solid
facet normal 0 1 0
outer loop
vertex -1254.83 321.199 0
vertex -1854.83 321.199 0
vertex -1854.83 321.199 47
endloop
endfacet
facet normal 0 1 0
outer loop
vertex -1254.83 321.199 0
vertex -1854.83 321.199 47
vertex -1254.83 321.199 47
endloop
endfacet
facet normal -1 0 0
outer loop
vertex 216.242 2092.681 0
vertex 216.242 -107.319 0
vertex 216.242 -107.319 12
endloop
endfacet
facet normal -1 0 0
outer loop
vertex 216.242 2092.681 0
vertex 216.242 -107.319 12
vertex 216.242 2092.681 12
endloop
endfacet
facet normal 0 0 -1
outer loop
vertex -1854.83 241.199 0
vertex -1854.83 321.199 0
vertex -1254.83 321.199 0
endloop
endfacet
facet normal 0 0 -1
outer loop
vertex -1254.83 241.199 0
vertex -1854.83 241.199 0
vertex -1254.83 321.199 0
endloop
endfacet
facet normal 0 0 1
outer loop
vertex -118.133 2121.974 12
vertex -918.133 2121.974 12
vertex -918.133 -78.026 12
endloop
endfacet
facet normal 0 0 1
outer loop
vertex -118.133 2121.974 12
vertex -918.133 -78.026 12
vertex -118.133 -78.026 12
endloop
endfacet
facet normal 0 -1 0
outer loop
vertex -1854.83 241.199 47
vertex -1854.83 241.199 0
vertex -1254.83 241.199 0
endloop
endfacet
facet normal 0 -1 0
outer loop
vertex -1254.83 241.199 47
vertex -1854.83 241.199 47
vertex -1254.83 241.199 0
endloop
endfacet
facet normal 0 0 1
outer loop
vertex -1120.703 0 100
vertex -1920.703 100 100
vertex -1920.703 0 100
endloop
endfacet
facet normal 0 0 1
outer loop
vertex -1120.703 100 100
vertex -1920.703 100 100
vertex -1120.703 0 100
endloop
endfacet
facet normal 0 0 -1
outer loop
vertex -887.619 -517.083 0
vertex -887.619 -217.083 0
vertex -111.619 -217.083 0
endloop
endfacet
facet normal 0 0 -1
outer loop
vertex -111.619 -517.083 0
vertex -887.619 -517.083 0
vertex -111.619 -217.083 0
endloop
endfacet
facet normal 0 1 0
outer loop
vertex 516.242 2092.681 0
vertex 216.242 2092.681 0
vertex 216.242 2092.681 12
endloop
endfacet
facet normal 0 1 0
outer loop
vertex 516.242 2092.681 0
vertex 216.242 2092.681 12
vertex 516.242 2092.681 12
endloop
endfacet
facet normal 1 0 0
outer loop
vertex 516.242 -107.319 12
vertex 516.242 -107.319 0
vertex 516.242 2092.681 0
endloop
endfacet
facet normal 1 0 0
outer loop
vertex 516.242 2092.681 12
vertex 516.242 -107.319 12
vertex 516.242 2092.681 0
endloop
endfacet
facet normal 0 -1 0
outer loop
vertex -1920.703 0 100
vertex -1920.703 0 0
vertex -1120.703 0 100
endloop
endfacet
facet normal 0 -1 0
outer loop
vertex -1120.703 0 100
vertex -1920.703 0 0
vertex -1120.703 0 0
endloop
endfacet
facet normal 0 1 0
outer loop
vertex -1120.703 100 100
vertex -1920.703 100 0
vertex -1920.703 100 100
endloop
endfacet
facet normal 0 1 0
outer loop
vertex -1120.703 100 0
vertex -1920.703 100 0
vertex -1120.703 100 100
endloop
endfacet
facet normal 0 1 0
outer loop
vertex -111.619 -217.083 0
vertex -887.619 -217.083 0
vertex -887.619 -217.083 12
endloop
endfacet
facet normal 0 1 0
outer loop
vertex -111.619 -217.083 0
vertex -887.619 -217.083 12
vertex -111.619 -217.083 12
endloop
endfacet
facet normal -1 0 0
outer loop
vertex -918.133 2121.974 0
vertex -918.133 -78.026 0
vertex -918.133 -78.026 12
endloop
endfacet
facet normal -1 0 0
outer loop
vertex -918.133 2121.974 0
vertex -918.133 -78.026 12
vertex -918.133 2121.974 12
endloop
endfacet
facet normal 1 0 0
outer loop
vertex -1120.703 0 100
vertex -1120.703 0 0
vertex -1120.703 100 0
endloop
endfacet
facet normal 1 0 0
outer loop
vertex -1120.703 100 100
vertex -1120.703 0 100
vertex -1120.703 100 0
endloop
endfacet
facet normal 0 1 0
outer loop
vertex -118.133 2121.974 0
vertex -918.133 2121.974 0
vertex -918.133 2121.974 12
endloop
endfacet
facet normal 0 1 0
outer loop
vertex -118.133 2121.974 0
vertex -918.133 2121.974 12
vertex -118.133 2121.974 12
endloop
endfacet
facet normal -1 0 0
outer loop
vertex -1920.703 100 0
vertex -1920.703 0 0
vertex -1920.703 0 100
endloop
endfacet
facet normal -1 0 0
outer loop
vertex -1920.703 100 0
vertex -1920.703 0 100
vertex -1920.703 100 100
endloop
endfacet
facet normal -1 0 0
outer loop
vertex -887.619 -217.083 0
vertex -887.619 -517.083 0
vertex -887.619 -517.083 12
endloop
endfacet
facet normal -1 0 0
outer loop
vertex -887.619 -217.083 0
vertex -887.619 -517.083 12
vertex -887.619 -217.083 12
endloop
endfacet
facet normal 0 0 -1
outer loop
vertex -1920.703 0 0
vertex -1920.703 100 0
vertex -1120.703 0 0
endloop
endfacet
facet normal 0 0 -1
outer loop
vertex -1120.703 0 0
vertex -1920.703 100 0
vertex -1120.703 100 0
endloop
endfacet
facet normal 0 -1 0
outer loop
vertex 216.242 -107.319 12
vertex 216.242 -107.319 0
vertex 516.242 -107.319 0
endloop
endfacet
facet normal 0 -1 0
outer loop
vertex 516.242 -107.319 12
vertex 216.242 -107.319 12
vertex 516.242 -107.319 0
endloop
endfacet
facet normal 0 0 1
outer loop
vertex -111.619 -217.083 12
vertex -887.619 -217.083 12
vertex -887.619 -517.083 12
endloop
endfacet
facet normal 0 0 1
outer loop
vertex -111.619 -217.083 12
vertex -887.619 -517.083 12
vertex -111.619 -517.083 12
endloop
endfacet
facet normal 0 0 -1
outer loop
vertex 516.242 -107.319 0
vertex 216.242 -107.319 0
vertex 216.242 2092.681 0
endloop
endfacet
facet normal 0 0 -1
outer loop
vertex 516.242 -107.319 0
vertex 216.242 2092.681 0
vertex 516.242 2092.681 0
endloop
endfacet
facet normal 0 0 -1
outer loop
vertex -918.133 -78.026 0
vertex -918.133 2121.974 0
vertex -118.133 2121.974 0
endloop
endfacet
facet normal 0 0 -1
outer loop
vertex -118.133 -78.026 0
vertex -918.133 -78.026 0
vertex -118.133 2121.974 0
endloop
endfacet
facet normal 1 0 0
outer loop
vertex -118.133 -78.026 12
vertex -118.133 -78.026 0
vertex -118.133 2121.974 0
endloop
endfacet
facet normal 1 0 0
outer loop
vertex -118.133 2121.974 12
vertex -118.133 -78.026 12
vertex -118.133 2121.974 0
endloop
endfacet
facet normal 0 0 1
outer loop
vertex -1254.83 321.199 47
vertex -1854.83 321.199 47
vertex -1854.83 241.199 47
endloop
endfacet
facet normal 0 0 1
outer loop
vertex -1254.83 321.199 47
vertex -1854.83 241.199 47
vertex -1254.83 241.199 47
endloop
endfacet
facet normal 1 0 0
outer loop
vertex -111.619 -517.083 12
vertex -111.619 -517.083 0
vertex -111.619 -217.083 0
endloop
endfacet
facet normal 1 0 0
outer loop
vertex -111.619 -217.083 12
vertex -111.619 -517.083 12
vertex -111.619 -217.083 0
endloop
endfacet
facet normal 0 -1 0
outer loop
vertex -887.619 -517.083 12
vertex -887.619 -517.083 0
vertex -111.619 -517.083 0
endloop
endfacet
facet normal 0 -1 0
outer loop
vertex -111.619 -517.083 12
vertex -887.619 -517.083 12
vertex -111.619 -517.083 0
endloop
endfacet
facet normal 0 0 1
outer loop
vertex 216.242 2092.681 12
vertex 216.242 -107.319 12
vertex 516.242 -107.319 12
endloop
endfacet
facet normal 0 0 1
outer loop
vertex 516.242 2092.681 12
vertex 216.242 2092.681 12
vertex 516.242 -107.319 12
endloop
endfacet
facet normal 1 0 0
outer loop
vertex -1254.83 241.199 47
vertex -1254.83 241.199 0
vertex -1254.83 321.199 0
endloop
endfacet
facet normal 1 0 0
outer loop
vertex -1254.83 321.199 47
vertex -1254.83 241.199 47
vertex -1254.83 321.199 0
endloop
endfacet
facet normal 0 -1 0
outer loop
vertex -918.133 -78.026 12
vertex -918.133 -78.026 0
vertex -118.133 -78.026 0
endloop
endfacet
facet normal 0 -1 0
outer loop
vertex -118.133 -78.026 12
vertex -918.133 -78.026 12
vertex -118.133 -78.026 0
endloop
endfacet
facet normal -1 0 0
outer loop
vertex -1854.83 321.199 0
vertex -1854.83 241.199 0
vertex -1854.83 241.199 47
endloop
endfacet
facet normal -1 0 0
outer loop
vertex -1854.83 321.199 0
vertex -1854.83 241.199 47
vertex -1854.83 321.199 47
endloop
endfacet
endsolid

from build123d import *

# Parameters (mm, degrees)
F0_W     = 800
F0_H     = 2200
F2_DEPTH = 12
F1_W     = 300
F1_H     = 2200
F3_DEPTH = 12
F4_W     = 776
F4_H     = 300
F5_DEPTH = 12
F6_W     = 800
F6_H     = 100
F7_DEPTH = 100
F8_W     = 600
F8_H     = 80
F9_DEPTH = 47


with BuildPart() as f2:
    # F0 (on Top) → F2 (new body)
    with BuildSketch(Plane.XY):
        with Locations((-518.132778, 1021.973884)):
            Rectangle(F0_W, F0_H)
    extrude(amount=F2_DEPTH)


with BuildPart() as f3:
    # F1 (on Top) → F3 (new body)
    with BuildSketch(Plane.XY):
        with Locations((366.242298, 992.681062)):
            Rectangle(F1_W, F1_H)
    extrude(amount=F3_DEPTH)


with BuildPart() as f5:
    # F4 (on Top) → F5 (new body)
    with BuildSketch(Plane.XY):
        with Locations((-499.619242, -367.083466)):
            Rectangle(F4_W, F4_H)
    extrude(amount=F5_DEPTH)


with BuildPart() as f7:
    # F6 (on Top) → F7 (new body)
    with BuildSketch(Plane.XY):
        with Locations((-1520.702577, 50)):
            Rectangle(F6_W, F6_H)
    extrude(amount=F7_DEPTH)


with BuildPart() as f9:
    # F8 (on Top) → F9 (new body)
    with BuildSketch(Plane.XY):
        with Locations((-1554.830384, 281.19854)):
            Rectangle(F8_W, F8_H)
    extrude(amount=F9_DEPTH)


solid = Compound([f2.part, f3.part, f5.part, f7.part, f9.part])
